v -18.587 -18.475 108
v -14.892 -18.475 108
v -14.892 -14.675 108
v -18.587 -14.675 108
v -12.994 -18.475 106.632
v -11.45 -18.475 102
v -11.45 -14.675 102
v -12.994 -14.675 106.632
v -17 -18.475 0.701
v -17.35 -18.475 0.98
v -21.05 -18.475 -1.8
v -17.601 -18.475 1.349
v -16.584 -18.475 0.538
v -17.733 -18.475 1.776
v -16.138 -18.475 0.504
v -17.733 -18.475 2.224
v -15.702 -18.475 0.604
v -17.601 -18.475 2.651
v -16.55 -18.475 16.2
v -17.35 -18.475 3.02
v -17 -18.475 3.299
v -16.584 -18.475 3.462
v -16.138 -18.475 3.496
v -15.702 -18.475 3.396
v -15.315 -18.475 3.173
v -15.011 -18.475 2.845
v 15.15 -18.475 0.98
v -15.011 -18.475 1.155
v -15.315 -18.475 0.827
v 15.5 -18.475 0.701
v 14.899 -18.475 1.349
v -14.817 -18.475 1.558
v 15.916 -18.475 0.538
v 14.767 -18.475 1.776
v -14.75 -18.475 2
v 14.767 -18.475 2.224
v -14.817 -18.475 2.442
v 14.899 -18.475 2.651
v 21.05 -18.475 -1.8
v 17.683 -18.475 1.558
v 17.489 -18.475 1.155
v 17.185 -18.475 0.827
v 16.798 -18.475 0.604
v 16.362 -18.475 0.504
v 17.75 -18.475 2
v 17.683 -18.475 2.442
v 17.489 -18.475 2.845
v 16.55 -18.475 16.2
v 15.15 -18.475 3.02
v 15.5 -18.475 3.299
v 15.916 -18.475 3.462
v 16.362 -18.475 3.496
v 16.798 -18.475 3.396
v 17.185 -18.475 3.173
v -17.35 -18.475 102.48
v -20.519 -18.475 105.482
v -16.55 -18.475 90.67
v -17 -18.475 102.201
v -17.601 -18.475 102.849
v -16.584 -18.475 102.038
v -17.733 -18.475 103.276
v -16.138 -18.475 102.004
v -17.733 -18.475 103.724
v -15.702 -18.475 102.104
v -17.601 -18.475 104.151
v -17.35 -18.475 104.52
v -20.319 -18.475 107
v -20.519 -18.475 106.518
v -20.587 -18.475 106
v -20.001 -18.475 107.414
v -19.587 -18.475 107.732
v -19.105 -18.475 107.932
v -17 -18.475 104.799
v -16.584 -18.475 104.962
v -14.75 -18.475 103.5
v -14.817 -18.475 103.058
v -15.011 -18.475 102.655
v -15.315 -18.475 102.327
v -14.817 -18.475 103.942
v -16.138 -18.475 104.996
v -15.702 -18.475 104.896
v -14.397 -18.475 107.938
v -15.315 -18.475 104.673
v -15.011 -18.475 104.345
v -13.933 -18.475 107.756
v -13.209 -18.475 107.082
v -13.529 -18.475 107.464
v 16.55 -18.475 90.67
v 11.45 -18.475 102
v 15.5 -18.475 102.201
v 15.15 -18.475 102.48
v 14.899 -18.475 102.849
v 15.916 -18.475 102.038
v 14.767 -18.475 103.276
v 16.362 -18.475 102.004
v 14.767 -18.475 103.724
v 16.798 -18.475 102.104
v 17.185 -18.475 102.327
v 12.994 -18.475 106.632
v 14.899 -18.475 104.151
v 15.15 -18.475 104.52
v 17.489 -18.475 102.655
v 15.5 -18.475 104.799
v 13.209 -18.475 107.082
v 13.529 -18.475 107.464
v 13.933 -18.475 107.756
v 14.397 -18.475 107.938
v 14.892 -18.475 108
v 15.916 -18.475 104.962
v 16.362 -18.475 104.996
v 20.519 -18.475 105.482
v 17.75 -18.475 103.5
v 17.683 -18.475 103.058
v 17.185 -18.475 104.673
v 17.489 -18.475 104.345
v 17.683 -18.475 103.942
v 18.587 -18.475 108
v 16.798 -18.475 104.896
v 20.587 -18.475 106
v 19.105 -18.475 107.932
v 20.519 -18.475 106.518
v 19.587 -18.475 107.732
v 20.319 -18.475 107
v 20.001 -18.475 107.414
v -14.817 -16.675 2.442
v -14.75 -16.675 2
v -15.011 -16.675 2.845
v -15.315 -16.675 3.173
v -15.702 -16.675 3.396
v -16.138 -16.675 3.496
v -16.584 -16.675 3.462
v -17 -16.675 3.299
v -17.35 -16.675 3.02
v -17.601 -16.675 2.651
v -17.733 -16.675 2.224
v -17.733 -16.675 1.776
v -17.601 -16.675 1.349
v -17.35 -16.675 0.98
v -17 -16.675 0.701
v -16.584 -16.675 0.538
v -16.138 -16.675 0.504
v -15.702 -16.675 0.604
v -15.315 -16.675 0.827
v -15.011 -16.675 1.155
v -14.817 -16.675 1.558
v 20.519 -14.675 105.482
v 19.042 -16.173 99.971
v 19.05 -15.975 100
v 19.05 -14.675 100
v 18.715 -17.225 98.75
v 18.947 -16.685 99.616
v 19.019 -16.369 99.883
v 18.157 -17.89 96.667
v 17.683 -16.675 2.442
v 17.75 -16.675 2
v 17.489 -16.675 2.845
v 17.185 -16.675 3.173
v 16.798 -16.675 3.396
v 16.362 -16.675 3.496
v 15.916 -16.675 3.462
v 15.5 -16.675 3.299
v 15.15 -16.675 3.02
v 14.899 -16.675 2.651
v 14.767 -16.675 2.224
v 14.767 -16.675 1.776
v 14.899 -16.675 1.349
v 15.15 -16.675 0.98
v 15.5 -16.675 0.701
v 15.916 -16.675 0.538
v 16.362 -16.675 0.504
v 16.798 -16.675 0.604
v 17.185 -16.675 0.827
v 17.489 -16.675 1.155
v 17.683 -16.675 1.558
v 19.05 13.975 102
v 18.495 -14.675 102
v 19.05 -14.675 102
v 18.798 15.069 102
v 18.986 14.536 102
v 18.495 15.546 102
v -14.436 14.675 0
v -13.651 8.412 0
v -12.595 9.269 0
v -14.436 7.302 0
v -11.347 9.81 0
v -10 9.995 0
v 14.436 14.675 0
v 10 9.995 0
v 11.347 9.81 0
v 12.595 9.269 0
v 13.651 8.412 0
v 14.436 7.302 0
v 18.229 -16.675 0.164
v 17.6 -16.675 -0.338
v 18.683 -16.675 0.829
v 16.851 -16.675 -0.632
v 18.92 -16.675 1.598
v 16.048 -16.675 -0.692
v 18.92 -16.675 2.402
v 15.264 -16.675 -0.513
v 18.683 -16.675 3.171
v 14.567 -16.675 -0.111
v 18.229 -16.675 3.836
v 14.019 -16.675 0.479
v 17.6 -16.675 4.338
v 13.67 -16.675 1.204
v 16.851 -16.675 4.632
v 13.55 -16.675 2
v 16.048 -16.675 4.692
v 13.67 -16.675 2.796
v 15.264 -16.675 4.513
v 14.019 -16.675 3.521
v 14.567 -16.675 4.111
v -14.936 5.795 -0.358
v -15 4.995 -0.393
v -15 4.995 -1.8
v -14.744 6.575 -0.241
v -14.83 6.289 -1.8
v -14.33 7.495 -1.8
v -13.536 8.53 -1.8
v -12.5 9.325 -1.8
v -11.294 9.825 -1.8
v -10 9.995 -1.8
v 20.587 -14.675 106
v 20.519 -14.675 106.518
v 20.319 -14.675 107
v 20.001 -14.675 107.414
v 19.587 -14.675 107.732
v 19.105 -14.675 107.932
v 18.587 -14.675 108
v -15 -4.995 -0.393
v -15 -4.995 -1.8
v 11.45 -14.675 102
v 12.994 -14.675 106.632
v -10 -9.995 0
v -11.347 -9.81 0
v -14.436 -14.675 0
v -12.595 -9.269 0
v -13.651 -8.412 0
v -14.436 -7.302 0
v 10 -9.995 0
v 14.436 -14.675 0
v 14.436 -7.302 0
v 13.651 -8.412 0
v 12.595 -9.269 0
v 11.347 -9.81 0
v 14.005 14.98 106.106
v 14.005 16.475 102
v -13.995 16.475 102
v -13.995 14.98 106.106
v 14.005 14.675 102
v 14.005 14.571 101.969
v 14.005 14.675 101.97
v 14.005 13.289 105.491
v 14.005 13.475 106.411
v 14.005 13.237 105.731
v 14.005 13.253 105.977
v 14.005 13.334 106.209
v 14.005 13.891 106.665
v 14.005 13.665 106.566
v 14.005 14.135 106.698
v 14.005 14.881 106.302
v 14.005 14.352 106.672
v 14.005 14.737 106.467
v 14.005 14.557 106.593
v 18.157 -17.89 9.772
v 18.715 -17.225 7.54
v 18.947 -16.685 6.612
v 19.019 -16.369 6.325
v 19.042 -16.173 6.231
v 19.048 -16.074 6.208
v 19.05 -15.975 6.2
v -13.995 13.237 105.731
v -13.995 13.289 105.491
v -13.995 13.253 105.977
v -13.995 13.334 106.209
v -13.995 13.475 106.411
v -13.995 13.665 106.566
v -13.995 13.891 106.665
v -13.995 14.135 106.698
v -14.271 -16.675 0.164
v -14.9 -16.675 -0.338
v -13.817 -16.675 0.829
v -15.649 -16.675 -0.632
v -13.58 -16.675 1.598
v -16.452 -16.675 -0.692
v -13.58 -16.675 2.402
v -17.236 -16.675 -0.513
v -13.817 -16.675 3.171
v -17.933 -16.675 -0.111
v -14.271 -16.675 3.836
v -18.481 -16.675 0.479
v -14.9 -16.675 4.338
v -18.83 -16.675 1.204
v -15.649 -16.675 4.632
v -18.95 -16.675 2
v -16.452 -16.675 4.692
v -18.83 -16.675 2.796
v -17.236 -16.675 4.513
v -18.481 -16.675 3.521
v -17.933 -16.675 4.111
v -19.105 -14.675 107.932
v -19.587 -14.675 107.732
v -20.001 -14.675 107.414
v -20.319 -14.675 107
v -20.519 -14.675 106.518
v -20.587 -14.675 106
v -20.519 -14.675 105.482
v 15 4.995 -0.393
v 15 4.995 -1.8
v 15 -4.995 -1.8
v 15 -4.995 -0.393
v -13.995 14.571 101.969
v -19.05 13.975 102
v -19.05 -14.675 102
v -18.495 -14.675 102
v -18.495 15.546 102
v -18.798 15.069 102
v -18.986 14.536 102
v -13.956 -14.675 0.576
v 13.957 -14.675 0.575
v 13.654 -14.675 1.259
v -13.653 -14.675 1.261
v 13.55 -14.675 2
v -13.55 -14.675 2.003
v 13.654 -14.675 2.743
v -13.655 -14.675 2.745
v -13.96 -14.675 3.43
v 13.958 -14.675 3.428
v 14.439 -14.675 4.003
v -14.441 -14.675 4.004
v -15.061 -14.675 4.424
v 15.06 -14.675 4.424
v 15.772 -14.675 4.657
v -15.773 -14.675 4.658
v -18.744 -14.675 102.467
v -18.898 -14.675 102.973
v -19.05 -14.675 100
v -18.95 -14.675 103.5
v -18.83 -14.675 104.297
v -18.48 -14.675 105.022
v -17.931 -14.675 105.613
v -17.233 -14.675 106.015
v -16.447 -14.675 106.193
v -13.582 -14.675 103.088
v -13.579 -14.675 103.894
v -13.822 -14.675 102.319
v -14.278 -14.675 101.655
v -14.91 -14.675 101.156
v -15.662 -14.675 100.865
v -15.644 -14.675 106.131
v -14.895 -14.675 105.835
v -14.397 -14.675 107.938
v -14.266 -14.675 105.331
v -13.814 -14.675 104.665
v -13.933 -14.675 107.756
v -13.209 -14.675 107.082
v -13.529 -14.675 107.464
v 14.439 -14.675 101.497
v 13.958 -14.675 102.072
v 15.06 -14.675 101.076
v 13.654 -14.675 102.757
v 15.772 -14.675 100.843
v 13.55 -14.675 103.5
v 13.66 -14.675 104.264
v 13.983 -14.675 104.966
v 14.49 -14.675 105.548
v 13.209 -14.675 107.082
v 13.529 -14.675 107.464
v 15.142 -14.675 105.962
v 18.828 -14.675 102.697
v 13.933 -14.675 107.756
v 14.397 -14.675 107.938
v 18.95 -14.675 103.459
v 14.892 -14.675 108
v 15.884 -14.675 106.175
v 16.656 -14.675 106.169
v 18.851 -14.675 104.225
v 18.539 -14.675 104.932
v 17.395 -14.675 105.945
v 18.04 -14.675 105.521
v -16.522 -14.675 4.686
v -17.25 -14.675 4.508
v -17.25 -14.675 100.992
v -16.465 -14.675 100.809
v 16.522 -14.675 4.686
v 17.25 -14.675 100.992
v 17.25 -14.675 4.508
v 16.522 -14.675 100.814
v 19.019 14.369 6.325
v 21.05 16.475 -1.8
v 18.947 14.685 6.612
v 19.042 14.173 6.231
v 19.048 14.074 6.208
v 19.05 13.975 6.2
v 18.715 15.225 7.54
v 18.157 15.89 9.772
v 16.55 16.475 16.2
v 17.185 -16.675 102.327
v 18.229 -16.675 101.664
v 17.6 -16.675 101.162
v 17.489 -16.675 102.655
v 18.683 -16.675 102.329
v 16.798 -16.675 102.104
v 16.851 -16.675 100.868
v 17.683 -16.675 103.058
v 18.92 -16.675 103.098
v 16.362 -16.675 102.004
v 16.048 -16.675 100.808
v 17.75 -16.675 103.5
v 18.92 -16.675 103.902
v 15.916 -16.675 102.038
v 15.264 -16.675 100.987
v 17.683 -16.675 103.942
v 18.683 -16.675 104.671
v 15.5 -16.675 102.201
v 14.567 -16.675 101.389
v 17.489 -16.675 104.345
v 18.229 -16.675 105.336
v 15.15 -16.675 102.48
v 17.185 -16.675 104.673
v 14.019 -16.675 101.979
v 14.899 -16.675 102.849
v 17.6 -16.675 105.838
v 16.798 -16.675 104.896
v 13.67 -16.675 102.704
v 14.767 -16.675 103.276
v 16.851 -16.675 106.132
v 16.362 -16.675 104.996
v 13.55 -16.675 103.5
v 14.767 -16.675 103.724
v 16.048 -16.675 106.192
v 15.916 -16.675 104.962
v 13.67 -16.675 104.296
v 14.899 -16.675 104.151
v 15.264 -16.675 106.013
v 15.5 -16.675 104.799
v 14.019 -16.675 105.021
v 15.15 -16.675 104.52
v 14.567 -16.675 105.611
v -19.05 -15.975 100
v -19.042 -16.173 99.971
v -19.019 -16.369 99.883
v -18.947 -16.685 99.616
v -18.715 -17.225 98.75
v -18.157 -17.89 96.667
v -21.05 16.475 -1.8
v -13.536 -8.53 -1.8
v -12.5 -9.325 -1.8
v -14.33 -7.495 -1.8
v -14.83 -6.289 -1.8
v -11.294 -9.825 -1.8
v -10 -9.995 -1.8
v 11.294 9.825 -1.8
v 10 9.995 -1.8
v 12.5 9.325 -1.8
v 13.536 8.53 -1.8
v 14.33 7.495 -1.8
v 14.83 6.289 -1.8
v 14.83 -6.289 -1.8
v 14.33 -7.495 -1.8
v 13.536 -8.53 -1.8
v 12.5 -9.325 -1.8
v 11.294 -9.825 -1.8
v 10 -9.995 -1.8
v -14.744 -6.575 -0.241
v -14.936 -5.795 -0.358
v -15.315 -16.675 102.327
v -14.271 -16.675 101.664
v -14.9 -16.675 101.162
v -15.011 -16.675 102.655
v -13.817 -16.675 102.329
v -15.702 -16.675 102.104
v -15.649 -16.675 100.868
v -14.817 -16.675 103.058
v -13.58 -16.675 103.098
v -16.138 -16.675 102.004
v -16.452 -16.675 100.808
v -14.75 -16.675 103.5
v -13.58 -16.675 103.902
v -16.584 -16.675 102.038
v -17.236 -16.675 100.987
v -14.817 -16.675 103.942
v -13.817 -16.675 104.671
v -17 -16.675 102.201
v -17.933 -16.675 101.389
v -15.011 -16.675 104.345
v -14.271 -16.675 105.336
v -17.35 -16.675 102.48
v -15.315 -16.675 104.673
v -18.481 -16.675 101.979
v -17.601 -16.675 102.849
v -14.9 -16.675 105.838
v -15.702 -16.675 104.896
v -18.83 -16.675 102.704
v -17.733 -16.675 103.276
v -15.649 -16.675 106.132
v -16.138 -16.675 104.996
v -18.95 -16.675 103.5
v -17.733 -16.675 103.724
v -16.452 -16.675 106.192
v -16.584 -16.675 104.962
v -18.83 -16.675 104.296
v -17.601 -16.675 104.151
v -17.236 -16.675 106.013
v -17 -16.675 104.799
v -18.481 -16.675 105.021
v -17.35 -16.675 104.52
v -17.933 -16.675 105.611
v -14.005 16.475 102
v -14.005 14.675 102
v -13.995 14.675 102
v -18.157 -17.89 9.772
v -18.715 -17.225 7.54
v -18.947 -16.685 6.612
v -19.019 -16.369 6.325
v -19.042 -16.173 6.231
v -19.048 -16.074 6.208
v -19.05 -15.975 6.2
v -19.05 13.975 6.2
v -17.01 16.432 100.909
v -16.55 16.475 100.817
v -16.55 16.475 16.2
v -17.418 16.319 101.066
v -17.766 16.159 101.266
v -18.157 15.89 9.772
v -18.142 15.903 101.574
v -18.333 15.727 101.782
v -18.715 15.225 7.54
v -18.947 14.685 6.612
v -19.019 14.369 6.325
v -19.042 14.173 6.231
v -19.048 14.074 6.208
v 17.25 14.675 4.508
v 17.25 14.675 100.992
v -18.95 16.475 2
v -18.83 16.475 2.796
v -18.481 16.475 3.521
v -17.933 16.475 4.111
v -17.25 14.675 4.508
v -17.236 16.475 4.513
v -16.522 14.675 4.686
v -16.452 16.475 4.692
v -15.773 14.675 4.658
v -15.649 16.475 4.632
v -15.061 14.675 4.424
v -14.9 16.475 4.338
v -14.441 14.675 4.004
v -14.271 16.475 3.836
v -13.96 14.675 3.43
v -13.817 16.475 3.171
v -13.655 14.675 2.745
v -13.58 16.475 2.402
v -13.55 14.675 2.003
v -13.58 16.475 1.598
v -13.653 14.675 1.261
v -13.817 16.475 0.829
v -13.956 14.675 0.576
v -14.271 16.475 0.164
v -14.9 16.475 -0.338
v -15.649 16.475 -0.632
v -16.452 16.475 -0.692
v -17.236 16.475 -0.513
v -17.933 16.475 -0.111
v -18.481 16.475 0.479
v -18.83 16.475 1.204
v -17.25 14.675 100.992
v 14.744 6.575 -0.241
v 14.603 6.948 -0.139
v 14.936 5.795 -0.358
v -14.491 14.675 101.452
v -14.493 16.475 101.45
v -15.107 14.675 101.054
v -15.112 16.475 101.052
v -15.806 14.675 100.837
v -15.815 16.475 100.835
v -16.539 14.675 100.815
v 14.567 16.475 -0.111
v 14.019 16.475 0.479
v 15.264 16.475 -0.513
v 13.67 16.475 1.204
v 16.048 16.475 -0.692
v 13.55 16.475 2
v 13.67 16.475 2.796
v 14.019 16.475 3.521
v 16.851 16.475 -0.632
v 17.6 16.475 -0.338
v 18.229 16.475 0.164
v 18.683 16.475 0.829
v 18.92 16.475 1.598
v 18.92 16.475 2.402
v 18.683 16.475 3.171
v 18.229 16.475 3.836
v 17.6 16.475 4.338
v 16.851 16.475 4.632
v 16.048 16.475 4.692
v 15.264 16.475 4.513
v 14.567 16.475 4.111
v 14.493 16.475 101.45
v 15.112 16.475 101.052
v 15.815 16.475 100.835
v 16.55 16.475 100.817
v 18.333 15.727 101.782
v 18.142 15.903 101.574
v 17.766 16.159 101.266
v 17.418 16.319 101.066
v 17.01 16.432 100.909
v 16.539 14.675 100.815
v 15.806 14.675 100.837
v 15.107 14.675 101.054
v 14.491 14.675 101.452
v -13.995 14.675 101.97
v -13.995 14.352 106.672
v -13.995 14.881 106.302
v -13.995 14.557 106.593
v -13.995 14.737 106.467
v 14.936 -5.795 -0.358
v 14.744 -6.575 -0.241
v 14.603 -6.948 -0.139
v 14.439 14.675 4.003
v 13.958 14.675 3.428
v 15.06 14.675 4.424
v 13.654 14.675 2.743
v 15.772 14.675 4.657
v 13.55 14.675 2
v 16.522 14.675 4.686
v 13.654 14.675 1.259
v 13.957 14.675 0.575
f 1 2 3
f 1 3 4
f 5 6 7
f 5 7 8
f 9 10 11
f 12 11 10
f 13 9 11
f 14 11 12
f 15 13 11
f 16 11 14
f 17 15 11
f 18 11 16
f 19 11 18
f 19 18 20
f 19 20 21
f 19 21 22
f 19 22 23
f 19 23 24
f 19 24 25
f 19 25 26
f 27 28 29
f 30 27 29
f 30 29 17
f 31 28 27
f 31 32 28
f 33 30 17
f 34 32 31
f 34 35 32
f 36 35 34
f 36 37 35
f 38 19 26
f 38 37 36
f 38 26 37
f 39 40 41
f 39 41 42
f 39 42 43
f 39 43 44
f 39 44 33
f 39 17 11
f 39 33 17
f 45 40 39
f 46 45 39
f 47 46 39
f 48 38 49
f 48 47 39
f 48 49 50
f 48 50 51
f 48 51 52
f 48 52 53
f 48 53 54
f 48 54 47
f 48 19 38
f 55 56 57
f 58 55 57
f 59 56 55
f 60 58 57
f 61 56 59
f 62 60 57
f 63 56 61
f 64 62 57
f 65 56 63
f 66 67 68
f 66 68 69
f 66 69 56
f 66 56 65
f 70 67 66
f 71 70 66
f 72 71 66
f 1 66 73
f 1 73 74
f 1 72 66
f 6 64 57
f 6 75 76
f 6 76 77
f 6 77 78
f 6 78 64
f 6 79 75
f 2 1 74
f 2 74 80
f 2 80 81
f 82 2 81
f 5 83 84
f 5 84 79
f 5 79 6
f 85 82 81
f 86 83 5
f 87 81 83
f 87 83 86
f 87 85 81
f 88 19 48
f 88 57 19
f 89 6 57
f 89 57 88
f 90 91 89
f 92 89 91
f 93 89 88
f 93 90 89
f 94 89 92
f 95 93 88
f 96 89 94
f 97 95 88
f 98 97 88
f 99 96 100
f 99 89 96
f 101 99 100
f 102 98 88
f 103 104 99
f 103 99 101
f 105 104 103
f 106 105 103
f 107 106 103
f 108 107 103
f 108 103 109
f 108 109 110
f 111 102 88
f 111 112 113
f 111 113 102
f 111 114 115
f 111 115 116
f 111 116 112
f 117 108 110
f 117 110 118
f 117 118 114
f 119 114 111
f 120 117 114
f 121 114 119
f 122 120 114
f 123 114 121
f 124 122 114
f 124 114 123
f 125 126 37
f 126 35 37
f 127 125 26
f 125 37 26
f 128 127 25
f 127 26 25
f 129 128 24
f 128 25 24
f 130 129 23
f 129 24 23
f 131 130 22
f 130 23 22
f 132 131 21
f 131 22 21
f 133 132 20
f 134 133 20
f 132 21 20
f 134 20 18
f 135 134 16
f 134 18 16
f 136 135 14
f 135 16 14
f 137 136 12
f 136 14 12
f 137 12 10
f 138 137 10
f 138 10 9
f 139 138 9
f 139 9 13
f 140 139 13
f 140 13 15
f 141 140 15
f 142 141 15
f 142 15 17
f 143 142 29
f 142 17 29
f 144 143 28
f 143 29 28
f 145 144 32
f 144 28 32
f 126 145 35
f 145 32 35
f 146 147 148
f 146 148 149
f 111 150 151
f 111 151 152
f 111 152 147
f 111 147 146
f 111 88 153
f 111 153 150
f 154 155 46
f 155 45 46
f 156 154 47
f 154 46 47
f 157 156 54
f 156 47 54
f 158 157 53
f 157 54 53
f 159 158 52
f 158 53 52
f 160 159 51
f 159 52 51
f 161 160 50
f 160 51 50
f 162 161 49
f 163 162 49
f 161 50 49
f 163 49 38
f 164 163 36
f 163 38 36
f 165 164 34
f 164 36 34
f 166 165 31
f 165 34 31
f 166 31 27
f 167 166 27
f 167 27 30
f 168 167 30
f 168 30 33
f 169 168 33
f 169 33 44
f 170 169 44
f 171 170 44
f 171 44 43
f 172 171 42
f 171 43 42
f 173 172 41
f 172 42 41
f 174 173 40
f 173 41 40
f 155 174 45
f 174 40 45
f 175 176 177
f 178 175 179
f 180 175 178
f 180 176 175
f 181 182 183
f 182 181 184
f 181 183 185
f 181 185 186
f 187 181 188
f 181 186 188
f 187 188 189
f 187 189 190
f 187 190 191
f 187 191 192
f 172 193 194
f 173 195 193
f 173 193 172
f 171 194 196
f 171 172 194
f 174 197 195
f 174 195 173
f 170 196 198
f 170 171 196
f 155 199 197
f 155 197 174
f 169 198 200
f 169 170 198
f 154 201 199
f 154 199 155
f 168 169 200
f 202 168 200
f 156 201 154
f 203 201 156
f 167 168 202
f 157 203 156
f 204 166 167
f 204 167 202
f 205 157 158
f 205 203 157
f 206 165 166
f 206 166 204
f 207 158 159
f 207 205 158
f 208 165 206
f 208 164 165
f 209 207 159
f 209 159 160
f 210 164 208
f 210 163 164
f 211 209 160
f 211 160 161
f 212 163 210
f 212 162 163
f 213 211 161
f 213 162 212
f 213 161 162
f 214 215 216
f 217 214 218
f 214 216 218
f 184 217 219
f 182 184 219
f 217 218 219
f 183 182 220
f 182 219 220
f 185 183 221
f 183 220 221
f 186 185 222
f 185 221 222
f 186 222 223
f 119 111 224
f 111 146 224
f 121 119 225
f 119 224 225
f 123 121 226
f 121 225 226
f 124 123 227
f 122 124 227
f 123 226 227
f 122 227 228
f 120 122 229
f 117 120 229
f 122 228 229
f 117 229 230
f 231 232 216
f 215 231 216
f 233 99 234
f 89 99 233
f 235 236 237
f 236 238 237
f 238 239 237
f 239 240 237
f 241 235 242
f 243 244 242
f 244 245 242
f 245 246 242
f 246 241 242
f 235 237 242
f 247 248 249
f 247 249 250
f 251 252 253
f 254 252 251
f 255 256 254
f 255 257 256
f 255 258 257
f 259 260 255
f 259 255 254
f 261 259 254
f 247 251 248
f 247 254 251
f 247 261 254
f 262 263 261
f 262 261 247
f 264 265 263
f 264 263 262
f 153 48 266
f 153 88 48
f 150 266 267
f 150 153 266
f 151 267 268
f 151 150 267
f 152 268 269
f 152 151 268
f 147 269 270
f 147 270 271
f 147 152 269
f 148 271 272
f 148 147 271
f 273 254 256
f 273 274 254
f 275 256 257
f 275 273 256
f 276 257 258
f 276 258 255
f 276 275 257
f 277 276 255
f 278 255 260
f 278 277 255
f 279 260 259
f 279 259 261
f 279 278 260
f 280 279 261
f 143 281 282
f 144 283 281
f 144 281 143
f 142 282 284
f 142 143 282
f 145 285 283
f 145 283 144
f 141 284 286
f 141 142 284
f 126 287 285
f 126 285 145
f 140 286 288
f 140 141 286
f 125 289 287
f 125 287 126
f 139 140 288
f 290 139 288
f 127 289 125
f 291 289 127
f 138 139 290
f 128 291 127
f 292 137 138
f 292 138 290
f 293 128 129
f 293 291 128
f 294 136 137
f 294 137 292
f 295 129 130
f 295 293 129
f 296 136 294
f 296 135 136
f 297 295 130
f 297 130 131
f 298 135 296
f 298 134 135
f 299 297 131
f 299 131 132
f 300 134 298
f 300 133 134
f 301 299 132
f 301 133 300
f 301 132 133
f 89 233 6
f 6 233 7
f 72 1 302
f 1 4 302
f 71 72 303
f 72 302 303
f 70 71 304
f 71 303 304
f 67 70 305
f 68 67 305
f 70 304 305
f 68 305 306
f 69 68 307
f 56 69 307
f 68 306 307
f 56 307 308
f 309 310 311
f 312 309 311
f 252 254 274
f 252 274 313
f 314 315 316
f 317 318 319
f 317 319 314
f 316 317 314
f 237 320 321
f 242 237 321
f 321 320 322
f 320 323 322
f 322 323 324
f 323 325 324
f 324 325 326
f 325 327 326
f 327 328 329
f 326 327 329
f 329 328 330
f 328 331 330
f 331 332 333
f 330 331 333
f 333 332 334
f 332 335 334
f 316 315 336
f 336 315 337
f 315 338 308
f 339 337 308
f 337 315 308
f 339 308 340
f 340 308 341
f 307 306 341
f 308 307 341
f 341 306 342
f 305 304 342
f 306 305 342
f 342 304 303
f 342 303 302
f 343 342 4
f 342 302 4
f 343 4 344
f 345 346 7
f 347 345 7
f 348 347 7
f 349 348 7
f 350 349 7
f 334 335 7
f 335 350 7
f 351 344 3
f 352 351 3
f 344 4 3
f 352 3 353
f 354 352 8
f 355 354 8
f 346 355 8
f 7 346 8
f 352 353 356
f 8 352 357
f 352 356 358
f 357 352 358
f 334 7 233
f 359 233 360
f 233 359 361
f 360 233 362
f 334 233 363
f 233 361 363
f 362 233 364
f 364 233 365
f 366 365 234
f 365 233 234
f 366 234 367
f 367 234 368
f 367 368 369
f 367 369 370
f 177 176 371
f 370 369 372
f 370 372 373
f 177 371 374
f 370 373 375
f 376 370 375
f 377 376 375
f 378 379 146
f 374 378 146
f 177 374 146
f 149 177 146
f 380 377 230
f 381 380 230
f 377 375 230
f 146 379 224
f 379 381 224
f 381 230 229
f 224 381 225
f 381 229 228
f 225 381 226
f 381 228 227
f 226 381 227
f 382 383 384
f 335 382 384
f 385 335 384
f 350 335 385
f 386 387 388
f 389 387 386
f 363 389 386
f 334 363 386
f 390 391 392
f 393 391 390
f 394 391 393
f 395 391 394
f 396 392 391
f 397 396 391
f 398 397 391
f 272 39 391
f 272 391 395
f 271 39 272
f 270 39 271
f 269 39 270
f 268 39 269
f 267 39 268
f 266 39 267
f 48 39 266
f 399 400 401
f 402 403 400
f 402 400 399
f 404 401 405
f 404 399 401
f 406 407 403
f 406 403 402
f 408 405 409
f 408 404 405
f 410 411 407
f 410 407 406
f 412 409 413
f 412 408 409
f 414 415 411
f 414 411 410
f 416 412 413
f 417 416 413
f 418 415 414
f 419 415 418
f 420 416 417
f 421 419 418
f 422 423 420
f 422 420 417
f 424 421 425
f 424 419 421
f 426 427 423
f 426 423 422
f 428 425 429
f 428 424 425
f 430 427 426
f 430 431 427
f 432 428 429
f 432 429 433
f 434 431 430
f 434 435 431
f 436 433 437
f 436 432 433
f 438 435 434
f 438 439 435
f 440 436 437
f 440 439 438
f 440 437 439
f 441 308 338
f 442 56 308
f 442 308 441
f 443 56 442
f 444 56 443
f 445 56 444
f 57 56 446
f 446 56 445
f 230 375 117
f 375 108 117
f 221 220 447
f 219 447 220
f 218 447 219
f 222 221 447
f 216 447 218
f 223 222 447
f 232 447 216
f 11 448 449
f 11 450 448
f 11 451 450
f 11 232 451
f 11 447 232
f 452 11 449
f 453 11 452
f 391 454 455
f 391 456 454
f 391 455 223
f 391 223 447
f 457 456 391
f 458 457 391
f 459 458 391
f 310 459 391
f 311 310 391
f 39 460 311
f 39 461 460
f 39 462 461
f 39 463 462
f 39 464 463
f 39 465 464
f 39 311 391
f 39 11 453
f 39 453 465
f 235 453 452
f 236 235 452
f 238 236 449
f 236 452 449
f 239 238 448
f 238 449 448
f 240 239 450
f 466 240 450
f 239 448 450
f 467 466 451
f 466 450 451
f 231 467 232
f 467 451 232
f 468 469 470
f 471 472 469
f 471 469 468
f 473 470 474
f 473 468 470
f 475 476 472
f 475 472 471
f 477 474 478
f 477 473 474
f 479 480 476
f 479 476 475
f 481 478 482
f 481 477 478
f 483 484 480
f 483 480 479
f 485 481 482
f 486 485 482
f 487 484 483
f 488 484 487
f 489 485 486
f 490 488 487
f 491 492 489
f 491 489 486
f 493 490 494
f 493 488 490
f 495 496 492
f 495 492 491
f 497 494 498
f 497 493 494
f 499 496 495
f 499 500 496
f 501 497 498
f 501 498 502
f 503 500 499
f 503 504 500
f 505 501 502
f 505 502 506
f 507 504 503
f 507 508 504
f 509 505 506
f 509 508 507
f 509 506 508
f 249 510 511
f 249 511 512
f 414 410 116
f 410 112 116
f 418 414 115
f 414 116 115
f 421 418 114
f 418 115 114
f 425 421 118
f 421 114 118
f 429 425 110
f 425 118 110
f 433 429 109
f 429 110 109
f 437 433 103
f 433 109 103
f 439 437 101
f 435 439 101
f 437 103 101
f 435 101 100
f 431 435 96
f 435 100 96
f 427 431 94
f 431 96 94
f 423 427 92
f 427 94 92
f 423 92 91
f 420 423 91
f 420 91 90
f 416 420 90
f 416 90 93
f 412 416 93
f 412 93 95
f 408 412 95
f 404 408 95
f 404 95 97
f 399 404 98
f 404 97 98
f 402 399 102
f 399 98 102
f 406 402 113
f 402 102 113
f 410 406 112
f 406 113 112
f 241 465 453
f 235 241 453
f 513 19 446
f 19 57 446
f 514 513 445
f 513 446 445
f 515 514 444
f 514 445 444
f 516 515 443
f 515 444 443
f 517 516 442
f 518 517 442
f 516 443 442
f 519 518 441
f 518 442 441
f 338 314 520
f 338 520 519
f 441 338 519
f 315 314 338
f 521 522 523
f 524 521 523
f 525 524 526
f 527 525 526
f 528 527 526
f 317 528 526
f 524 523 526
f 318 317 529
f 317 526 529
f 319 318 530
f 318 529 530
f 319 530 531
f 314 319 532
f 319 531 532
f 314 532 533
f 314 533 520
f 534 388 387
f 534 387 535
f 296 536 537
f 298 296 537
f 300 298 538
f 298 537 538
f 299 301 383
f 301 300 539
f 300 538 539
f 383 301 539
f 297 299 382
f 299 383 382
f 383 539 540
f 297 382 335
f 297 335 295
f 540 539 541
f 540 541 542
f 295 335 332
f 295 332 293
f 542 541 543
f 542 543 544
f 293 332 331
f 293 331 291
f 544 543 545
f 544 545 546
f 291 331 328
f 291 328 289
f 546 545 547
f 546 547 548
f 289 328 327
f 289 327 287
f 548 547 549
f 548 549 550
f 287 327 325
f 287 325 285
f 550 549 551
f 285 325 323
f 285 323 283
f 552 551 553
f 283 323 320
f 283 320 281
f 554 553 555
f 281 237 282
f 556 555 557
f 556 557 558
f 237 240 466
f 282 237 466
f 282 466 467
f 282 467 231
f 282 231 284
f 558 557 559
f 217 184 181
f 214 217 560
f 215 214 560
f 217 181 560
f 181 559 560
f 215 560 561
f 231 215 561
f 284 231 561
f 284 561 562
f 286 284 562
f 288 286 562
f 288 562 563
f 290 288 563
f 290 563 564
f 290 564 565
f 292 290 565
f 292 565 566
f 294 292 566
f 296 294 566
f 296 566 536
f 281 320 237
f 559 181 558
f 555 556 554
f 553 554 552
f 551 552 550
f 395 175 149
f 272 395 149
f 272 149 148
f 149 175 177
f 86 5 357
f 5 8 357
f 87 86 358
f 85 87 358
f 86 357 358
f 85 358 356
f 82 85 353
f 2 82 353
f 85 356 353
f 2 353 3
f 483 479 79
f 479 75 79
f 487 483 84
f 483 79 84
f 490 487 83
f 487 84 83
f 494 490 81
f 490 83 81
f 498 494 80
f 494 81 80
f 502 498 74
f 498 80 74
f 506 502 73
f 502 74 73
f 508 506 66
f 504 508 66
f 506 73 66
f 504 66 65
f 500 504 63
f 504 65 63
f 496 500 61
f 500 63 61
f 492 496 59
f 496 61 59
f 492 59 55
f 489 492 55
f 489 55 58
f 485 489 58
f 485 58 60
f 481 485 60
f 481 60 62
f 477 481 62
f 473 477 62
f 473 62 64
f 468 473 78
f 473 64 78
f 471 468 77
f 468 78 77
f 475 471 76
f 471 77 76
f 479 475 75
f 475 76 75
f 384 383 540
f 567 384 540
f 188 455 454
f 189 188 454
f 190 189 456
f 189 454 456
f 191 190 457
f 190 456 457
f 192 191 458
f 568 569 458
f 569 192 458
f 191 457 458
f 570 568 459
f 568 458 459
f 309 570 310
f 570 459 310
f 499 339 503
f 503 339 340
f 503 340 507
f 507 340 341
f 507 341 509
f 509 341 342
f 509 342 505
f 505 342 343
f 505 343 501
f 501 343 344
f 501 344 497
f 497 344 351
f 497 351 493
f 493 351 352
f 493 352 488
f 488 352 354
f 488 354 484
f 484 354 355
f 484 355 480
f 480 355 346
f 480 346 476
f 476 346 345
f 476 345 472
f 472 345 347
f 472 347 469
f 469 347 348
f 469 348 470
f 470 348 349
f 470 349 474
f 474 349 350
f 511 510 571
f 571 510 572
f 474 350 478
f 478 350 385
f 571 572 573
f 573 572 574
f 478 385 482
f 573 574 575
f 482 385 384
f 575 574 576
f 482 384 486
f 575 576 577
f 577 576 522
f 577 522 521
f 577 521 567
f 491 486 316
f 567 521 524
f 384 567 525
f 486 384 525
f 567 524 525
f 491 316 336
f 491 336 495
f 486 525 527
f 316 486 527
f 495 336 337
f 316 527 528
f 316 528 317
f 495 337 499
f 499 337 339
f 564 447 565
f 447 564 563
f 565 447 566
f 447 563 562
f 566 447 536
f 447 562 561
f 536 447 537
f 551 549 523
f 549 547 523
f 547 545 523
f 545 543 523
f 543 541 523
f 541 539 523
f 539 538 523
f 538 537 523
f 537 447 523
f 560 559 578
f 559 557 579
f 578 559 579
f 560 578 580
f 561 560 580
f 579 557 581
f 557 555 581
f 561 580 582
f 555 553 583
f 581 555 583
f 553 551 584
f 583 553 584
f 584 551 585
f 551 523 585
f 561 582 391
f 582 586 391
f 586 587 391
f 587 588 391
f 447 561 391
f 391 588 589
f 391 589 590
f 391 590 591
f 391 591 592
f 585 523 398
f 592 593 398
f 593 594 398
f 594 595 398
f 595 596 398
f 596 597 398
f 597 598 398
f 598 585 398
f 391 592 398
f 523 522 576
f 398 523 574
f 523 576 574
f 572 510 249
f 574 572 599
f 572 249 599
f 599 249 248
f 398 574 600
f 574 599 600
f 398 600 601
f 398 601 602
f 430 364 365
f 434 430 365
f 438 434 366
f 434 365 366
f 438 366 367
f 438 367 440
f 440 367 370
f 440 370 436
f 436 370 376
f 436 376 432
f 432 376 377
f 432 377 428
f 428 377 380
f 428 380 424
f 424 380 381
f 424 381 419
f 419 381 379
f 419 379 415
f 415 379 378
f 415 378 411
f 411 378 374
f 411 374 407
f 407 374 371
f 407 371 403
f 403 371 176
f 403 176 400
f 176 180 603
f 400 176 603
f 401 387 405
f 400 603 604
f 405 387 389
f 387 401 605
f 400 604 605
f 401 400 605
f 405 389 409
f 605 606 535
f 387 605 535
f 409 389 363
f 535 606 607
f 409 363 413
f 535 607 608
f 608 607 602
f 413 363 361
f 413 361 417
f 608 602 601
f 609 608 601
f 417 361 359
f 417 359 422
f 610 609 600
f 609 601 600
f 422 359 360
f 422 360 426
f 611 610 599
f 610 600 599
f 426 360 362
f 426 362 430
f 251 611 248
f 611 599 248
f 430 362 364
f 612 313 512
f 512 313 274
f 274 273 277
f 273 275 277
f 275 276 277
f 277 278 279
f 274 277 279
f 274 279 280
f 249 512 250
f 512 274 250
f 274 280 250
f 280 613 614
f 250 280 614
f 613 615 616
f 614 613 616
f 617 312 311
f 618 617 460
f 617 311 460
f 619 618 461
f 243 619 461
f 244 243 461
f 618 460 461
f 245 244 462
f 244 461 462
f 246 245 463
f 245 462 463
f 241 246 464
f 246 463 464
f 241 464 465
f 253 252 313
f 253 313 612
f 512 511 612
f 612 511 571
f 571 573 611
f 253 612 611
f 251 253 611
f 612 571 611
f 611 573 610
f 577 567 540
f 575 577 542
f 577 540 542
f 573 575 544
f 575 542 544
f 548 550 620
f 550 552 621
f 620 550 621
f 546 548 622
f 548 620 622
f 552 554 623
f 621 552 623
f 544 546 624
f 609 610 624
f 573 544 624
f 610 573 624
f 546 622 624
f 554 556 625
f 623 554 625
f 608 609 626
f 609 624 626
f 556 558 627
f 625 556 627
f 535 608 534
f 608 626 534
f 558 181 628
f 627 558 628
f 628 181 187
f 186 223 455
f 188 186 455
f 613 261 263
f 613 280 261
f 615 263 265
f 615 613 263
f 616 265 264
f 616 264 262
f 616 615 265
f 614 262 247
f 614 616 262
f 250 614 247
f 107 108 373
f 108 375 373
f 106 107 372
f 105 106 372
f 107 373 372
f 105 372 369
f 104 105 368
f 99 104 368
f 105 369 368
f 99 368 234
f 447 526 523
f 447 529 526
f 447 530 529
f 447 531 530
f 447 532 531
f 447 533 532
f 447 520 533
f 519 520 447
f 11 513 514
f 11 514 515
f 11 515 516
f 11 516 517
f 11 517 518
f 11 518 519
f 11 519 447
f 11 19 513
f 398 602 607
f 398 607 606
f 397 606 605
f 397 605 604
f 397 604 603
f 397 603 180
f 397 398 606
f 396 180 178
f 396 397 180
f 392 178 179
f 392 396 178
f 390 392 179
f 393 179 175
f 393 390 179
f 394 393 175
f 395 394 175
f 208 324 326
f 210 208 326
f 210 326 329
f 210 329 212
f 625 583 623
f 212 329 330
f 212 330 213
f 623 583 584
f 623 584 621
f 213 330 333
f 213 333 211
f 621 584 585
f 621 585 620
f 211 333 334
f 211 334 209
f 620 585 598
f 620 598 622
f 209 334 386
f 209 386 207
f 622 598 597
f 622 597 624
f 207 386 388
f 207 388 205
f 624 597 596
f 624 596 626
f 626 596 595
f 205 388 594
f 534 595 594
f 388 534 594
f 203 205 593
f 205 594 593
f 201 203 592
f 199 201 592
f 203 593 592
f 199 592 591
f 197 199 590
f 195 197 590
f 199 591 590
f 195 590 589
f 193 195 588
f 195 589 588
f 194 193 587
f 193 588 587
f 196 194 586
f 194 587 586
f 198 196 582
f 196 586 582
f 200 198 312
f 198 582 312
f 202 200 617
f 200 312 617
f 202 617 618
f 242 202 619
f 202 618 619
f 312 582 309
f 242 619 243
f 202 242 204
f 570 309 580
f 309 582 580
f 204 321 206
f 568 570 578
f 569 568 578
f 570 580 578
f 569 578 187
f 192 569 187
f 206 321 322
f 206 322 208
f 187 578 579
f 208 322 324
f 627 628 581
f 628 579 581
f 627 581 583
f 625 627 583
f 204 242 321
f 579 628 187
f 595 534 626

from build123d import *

# Parameters (mm, degrees)
F3_W           = 38.1
F3_H           = 32.95
F3_W_2         = 34.5
F3_H_2         = 29.35
F4_DEPTH       = 102
F6_W           = 5.6
F6_H           = 6
F7_DEPTH       = 1.8
F5_R           = 1.5
F9_DEPTH       = 2
F10_DEPTH      = 32.951
F10_DEPTH_BACK = 25
F11_W          = 38.1
F11_H          = 34.95
F12_DEPTH      = 1.8
F14_DEPTH      = 3.8
F15_R          = 2.7
F16_DEPTH      = 2
F16_DEPTH_BACK = 31.151
F17_DEPTH      = 31.15
F19_DEPTH      = 25
F20_R          = 2.5
F21_R          = 2
F24_DEPTH      = 28
F25_R          = 0.89999


# Not quite as in the source:
# - a fillet or chamfer is up to 0.001 mm smaller than in the source, because OpenCascade refuses the exact size


with BuildPart() as f4:
    # F3 (on Top) → F4 (new body)
    with BuildSketch(Plane.XY):
        Rectangle(F3_W, F3_H)
        Rectangle(F3_W_2, F3_H_2, mode=Mode.SUBTRACT)
    extrude(amount=F4_DEPTH)


with BuildPart() as f7:
    # F6 (on face) → F7 (new body)
    with BuildSketch(Plane.XZ.offset(16.475)):
        with Locations((-16.25, 105)):
            Rectangle(F6_W, F6_H)
    extrude(amount=-F7_DEPTH)


with BuildPart() as f7b:
    # F6 (on face) → F7, piece 2 (new body)
    with BuildSketch(Plane.XZ.offset(16.475)):
        with Locations((16.25, 105)):
            Rectangle(F6_W, F6_H)
    extrude(amount=-F7_DEPTH)


with BuildPart() as f4_1:
    add(f4.part)

    # F8: union F7, F7b
    add(f7.part)
    add(f7b.part)

    # F5 (on face) + F8_face (on face) → F9 (join)
    with BuildSketch(Plane.XZ.offset(16.475)):
        Polygon((16.25, 102), (-16.2500000167, 102), (-19.05, 102), (-19.05, 0), (19.05, 0), (19.05, 102), align=None)
        with Locations((-16.25, 2)):
            Circle(F5_R, mode=Mode.SUBTRACT)
        with Locations((16.25, 2)):
            Circle(F5_R, mode=Mode.SUBTRACT)
    with BuildSketch(Plane(origin=(0, -16.475, 51.9178934588), x_dir=(1, 0, 0), z_dir=(0, -1, 0))):
        Polygon((-19.05, 56.0821065412), (-19.05, -51.9178934588), (19.05, -51.9178934588), (19.05, 56.0821065412), (13.45, 56.0821065412), (13.45, 50.0821065412), (-13.45, 50.0821065412), (-13.45, 56.0821065412), align=None)
    extrude(amount=F9_DEPTH)

    # F5 (on face) → F10 (cut, two sides)
    with BuildSketch(Plane.XZ.offset(16.475)) as f10_sk:
        with Locations((-16.25, 2)):
            Circle(F5_R)
        with Locations((-16.25, 103.5)):
            Circle(F5_R)
        with Locations((16.25, 103.5)):
            Circle(F5_R)
        with Locations((16.25, 2)):
            Circle(F5_R)
    extrude(amount=-F10_DEPTH, mode=Mode.SUBTRACT)
    extrude(f10_sk.sketch, amount=F10_DEPTH_BACK, mode=Mode.SUBTRACT)

    # F11 (on face) → F12 (join)
    with BuildSketch(Plane(origin=(0, 0, 0), x_dir=(1, 0, 0), z_dir=(0, 0, -1))):
        with Locations((0, 1)):
            Rectangle(F11_W, F11_H)
    extrude(amount=F12_DEPTH)

    # F13 (on face) → F14 (join)
    with BuildSketch(Plane.XZ.offset(18.475)):
        Polygon((-19.05, 100), (-19.05, 108), (-21.1935935394, 108), align=None)
        Polygon((-21.05, -1.8), (-19.05, -1.8), (-19.05, 6.2), align=None)
        Polygon((21.05, -1.8), (19.05, 6.2), (19.05, -1.8), align=None)
        Polygon((21.1935935394, 108), (19.05, 108), (19.05, 100), align=None)
        Polygon((13.45, 102), (13.45, 108), (11.45, 102), align=None)
        Polygon((-13.45, 102), (-11.45, 102), (-13.45, 108), align=None)
    extrude(amount=-F14_DEPTH)

    # F15 (on face) → F16 (cut, two sides)
    with BuildSketch(Plane(origin=(0, -14.675, 0), x_dir=(-1, 0, 0), z_dir=(0, 1, 0))) as f16_sk:
        with Locations((-16.25, 103.5)):
            Circle(F15_R)
        with Locations((16.25, 103.5)):
            Circle(F15_R)
        with Locations((-16.25, 2)):
            Circle(F15_R)
        with Locations((16.25, 2)):
            Circle(F15_R)
    extrude(amount=-F16_DEPTH, mode=Mode.SUBTRACT)
    extrude(f16_sk.sketch, amount=F16_DEPTH_BACK, mode=Mode.SUBTRACT)

    # F17 (add, through all): faces of the model
    f17_faces = [f4_1.faces().sort_by_distance(p)[0] for p in [
        (-19.7166666667, -14.675, 0.8666666667),
        (19.7166666667, -14.675, 0.8666666667),
    ]]
    extrude(f17_faces, amount=F17_DEPTH)

    # F18 (on face) → F19 (cut)
    with BuildSketch(Plane(origin=(0, 0, -1.8), x_dir=(1, 0, 0), z_dir=(0, 0, -1))):
        with BuildLine():
            Line((10, 9.9949482828), (0, 9.9949482828))
            Line((0, 9.9949482828), (0, 0))
            Line((0, 0), (15, 0))
            Line((15, 0), (15, 4.9949482828))
            ThreePointArc((15, 4.9949482828), (13.5355339059, 8.5304821888), (10, 9.9949482828))
        make_face()
        with BuildLine():
            Line((0, 0), (0, 9.9949482828))
            Line((0, 9.9949482828), (-10, 9.9949482828))
            ThreePointArc((-10, 9.9949482828), (-13.5355339059, 8.5304821888), (-15, 4.9949482828))
            Line((-15, 4.9949482828), (-15, 0))
            Line((-15, 0), (0, 0))
        make_face()
        with BuildLine():
            Line((15, 0), (0, 0))
            Line((0, 0), (0, -9.9949482828))
            Line((0, -9.9949482828), (10, -9.9949482828))
            ThreePointArc((10, -9.9949482828), (13.5355339059, -8.5304821888), (15, -4.9949482828))
            Line((15, -4.9949482828), (15, 0))
        make_face()
        with BuildLine():
            Line((0, -9.9949482828), (0, 0))
            Line((0, 0), (-15, 0))
            Line((-15, 0), (-15, -4.9949482828))
            ThreePointArc((-15, -4.9949482828), (-13.5355339059, -8.5304821888), (-10, -9.9949482828))
            Line((-10, -9.9949482828), (0, -9.9949482828))
        make_face()
    extrude(amount=-F19_DEPTH, mode=Mode.SUBTRACT)

    # F20
    f20_edges = [f4_1.edges().sort_by_distance(p)[0] for p in [
        (-19.05, 16.475, 54.1),
        (19.05, 16.475, 54.1),
        (19.05, -18.475, 53.1),
        (-19.05, -18.475, 53.1),
    ]]
    fillet(f20_edges, radius=F20_R)

    # F21
    f21_edges = [f4_1.edges().sort_by_distance(p)[0] for p in [
        (-13.45, -16.575, 108),
        (-21.193594, -16.575, 108),
        (13.45, -16.575, 108),
        (21.193594, -16.575, 108),
    ]]
    fillet(f21_edges, radius=F21_R)

    # F23 (on face) → F24 (join)
    with BuildSketch(Plane.YZ.offset(14.0050055679)):
        Polygon((14.5708874184, 101.9686584017), (16.475, 102), (14.7648992834, 106.6984631039), (12.8493792929, 106.6984631039), align=None)
    extrude(amount=-F24_DEPTH)

    # F25 (radius 0.9 in the source; OpenCascade refuses exactly that, so slightly less here)
    f25_edges = [f4_1.edges().sort_by_distance(p)[0] for p in [
        (0.005006, 14.764899, 106.698463),
        (0.005006, 12.849379, 106.698463),
    ]]
    fillet(f25_edges, radius=F25_R)


solid = f4_1.part
